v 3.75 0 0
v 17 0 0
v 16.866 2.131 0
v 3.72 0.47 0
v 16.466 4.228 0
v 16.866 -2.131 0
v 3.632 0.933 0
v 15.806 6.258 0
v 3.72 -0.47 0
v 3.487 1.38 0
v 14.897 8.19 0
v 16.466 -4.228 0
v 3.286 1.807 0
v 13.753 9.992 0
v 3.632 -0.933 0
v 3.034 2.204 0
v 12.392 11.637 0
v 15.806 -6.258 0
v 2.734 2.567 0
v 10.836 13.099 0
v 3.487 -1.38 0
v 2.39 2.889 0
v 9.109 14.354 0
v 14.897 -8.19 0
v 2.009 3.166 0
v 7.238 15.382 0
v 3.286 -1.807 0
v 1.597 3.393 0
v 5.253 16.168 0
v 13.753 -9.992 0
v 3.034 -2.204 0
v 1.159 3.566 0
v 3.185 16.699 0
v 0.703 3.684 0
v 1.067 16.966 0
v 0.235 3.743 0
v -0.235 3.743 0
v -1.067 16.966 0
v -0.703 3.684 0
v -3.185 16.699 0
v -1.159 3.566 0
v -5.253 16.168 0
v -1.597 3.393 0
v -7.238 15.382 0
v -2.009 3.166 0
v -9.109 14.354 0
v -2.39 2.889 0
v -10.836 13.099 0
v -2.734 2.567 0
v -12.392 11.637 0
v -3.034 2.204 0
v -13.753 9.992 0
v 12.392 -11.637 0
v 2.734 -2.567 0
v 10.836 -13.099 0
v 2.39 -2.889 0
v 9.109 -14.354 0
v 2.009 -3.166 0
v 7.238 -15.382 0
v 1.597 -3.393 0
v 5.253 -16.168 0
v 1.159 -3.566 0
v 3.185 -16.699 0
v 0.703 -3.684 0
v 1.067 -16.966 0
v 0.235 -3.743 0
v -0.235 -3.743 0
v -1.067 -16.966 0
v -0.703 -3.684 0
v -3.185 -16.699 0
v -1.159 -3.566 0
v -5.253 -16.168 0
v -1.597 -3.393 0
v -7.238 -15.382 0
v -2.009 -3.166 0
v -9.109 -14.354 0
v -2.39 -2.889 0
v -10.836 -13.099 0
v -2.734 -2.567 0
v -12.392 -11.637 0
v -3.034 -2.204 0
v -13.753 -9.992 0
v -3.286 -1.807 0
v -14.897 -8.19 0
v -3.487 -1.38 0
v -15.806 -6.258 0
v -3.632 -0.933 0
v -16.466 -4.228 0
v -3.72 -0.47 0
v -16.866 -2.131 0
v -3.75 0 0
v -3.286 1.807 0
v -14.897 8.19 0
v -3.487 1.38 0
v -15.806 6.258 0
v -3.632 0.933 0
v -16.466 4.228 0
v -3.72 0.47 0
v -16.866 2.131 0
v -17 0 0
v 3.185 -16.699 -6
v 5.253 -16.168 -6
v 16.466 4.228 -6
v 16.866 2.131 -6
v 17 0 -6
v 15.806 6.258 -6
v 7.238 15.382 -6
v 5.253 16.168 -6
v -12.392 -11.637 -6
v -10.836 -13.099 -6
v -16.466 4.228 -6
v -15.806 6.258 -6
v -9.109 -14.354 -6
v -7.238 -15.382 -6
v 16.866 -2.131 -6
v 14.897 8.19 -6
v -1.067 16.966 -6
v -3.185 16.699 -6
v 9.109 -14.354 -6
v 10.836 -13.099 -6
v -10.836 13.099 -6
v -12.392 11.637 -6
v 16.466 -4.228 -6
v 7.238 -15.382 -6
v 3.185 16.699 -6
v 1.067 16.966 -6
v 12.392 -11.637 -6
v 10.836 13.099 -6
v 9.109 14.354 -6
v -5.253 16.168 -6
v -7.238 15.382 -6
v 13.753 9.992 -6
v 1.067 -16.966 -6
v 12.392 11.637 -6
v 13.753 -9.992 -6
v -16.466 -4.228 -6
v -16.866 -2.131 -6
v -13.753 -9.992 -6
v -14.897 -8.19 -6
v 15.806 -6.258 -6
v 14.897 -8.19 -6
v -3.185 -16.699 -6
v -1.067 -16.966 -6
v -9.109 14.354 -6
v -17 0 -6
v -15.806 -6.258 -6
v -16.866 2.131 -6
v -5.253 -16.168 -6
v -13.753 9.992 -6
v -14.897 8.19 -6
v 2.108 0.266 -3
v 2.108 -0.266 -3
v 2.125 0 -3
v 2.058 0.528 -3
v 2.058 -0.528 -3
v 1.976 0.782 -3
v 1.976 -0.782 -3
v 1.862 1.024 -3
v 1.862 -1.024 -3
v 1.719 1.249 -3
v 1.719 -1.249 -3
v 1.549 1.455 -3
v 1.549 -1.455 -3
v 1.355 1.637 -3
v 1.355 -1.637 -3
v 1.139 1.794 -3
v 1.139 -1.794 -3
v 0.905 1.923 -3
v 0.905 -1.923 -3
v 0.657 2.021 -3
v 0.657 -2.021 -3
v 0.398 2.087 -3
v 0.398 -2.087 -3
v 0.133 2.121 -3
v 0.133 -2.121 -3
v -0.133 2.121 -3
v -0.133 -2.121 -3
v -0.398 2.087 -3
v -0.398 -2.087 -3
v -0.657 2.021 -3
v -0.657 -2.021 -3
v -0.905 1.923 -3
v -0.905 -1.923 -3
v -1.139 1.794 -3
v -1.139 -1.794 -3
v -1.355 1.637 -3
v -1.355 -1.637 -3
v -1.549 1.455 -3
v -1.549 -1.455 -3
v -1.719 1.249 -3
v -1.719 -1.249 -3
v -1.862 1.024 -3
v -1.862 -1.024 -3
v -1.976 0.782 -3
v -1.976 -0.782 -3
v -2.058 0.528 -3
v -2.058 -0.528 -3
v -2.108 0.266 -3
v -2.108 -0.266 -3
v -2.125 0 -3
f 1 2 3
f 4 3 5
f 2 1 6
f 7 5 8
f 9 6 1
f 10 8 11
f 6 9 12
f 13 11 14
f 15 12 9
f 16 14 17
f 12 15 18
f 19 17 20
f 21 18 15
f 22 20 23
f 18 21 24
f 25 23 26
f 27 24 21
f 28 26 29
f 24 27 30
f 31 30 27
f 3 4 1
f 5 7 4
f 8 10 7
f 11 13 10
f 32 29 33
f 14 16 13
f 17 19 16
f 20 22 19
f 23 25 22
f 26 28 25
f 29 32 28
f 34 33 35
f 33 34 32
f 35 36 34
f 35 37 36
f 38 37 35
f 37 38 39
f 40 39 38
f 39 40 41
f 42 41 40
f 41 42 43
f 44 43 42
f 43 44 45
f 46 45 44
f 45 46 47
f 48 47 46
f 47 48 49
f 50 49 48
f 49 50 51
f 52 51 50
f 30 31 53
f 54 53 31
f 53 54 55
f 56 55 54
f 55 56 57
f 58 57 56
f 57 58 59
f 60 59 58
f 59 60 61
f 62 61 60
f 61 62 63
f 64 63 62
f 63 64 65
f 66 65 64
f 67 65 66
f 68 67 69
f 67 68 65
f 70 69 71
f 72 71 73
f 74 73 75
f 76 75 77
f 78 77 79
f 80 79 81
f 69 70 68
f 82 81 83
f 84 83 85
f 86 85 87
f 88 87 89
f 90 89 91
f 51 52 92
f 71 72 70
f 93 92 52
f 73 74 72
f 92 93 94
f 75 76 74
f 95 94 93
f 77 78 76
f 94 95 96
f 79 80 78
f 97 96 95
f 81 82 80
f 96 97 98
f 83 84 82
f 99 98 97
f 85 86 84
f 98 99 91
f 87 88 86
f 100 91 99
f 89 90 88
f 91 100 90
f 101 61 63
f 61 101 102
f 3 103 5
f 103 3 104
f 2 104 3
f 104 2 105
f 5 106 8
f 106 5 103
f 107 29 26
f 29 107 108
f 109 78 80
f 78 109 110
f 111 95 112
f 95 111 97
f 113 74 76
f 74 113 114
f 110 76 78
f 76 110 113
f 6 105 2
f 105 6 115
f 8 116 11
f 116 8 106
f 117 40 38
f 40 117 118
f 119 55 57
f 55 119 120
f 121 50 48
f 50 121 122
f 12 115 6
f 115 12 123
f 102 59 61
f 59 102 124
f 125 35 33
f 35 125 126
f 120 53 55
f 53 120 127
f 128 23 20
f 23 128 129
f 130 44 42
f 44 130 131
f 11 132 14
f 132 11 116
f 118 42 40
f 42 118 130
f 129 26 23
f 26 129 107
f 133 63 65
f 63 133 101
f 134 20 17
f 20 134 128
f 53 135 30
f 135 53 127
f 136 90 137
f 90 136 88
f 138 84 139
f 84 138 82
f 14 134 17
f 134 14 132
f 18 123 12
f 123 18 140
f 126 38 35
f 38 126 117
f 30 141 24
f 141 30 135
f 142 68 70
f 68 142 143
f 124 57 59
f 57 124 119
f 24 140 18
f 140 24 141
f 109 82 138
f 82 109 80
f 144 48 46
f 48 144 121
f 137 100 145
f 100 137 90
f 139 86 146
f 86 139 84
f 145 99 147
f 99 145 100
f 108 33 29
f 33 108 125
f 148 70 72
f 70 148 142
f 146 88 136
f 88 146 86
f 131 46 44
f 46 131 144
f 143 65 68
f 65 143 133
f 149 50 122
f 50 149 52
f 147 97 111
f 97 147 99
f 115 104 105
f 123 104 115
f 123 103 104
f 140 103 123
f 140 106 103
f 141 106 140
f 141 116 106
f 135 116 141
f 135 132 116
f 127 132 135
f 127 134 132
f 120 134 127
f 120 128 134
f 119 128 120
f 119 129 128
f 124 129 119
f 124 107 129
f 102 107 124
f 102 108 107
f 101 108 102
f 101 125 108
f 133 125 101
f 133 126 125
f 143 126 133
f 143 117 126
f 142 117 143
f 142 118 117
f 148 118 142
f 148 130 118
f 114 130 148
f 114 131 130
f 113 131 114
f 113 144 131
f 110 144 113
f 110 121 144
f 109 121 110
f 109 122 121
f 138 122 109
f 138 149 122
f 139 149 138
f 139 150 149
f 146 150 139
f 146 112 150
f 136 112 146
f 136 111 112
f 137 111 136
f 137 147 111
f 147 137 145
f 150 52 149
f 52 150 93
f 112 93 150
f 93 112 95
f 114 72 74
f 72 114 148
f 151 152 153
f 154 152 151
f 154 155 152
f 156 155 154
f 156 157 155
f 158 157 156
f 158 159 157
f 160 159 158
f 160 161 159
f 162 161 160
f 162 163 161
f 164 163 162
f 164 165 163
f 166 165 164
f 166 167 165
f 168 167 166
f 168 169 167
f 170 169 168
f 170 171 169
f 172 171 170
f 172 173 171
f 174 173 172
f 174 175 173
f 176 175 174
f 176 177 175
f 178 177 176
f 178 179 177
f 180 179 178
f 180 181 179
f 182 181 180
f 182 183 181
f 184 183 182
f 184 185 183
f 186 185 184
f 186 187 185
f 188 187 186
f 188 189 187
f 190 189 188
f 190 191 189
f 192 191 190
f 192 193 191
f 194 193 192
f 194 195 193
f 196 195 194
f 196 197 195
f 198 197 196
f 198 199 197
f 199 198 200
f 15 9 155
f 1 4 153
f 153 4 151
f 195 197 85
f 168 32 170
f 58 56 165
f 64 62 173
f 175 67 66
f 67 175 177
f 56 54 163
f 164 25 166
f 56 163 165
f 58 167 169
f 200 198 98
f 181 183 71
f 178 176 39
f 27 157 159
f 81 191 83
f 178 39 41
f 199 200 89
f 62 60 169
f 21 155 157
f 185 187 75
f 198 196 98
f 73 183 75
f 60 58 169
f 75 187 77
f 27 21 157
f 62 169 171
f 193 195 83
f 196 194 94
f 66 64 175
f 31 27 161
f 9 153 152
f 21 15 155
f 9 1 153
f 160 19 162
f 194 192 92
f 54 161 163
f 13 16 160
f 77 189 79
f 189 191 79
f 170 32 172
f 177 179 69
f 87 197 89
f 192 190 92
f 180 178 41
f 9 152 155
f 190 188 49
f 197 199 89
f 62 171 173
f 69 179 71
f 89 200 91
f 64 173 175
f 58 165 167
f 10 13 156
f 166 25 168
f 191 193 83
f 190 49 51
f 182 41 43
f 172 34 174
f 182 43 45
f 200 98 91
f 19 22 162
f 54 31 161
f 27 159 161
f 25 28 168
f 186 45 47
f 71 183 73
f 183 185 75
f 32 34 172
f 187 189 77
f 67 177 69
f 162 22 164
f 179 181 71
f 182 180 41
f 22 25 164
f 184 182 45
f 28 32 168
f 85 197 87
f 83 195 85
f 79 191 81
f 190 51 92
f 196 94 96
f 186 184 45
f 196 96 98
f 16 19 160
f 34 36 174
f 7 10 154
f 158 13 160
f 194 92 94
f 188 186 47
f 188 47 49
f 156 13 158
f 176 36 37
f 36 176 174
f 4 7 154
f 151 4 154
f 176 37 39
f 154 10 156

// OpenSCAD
$fn = 50;


difference() {
	union() {
		translate(v = [0, 0, -3.0000000000]) {
			cylinder(h = 3, r = 7.0000000000);
		}
		translate(v = [0, 0, -6.0000000000]) {
			cylinder(h = 6, r = 17.0000000000);
		}
	}
	union() {
		translate(v = [0, 0, 0]) {
			rotate(a = [0, 0, 0]) {
				difference() {
					union() {
						#translate(v = [0, 0, -3.0000000000]) {
							cylinder(h = 3, r = 2.0000000000);
						}
						#translate(v = [0, 0, -3]) {
							cylinder(h = 3, r = 7.0000000000, r1 = 2.1250000000, r2 = 3.7500000000);
						}
						#translate(v = [0, 0, -3.0000000000]) {
							cylinder(h = 3, r = 2.1250000000);
						}
						#translate(v = [0, 0, -3.0000000000]) {
							cylinder(h = 3, r = 2.0000000000);
						}
					}
					union();
				}
			}
		}
	}
}
